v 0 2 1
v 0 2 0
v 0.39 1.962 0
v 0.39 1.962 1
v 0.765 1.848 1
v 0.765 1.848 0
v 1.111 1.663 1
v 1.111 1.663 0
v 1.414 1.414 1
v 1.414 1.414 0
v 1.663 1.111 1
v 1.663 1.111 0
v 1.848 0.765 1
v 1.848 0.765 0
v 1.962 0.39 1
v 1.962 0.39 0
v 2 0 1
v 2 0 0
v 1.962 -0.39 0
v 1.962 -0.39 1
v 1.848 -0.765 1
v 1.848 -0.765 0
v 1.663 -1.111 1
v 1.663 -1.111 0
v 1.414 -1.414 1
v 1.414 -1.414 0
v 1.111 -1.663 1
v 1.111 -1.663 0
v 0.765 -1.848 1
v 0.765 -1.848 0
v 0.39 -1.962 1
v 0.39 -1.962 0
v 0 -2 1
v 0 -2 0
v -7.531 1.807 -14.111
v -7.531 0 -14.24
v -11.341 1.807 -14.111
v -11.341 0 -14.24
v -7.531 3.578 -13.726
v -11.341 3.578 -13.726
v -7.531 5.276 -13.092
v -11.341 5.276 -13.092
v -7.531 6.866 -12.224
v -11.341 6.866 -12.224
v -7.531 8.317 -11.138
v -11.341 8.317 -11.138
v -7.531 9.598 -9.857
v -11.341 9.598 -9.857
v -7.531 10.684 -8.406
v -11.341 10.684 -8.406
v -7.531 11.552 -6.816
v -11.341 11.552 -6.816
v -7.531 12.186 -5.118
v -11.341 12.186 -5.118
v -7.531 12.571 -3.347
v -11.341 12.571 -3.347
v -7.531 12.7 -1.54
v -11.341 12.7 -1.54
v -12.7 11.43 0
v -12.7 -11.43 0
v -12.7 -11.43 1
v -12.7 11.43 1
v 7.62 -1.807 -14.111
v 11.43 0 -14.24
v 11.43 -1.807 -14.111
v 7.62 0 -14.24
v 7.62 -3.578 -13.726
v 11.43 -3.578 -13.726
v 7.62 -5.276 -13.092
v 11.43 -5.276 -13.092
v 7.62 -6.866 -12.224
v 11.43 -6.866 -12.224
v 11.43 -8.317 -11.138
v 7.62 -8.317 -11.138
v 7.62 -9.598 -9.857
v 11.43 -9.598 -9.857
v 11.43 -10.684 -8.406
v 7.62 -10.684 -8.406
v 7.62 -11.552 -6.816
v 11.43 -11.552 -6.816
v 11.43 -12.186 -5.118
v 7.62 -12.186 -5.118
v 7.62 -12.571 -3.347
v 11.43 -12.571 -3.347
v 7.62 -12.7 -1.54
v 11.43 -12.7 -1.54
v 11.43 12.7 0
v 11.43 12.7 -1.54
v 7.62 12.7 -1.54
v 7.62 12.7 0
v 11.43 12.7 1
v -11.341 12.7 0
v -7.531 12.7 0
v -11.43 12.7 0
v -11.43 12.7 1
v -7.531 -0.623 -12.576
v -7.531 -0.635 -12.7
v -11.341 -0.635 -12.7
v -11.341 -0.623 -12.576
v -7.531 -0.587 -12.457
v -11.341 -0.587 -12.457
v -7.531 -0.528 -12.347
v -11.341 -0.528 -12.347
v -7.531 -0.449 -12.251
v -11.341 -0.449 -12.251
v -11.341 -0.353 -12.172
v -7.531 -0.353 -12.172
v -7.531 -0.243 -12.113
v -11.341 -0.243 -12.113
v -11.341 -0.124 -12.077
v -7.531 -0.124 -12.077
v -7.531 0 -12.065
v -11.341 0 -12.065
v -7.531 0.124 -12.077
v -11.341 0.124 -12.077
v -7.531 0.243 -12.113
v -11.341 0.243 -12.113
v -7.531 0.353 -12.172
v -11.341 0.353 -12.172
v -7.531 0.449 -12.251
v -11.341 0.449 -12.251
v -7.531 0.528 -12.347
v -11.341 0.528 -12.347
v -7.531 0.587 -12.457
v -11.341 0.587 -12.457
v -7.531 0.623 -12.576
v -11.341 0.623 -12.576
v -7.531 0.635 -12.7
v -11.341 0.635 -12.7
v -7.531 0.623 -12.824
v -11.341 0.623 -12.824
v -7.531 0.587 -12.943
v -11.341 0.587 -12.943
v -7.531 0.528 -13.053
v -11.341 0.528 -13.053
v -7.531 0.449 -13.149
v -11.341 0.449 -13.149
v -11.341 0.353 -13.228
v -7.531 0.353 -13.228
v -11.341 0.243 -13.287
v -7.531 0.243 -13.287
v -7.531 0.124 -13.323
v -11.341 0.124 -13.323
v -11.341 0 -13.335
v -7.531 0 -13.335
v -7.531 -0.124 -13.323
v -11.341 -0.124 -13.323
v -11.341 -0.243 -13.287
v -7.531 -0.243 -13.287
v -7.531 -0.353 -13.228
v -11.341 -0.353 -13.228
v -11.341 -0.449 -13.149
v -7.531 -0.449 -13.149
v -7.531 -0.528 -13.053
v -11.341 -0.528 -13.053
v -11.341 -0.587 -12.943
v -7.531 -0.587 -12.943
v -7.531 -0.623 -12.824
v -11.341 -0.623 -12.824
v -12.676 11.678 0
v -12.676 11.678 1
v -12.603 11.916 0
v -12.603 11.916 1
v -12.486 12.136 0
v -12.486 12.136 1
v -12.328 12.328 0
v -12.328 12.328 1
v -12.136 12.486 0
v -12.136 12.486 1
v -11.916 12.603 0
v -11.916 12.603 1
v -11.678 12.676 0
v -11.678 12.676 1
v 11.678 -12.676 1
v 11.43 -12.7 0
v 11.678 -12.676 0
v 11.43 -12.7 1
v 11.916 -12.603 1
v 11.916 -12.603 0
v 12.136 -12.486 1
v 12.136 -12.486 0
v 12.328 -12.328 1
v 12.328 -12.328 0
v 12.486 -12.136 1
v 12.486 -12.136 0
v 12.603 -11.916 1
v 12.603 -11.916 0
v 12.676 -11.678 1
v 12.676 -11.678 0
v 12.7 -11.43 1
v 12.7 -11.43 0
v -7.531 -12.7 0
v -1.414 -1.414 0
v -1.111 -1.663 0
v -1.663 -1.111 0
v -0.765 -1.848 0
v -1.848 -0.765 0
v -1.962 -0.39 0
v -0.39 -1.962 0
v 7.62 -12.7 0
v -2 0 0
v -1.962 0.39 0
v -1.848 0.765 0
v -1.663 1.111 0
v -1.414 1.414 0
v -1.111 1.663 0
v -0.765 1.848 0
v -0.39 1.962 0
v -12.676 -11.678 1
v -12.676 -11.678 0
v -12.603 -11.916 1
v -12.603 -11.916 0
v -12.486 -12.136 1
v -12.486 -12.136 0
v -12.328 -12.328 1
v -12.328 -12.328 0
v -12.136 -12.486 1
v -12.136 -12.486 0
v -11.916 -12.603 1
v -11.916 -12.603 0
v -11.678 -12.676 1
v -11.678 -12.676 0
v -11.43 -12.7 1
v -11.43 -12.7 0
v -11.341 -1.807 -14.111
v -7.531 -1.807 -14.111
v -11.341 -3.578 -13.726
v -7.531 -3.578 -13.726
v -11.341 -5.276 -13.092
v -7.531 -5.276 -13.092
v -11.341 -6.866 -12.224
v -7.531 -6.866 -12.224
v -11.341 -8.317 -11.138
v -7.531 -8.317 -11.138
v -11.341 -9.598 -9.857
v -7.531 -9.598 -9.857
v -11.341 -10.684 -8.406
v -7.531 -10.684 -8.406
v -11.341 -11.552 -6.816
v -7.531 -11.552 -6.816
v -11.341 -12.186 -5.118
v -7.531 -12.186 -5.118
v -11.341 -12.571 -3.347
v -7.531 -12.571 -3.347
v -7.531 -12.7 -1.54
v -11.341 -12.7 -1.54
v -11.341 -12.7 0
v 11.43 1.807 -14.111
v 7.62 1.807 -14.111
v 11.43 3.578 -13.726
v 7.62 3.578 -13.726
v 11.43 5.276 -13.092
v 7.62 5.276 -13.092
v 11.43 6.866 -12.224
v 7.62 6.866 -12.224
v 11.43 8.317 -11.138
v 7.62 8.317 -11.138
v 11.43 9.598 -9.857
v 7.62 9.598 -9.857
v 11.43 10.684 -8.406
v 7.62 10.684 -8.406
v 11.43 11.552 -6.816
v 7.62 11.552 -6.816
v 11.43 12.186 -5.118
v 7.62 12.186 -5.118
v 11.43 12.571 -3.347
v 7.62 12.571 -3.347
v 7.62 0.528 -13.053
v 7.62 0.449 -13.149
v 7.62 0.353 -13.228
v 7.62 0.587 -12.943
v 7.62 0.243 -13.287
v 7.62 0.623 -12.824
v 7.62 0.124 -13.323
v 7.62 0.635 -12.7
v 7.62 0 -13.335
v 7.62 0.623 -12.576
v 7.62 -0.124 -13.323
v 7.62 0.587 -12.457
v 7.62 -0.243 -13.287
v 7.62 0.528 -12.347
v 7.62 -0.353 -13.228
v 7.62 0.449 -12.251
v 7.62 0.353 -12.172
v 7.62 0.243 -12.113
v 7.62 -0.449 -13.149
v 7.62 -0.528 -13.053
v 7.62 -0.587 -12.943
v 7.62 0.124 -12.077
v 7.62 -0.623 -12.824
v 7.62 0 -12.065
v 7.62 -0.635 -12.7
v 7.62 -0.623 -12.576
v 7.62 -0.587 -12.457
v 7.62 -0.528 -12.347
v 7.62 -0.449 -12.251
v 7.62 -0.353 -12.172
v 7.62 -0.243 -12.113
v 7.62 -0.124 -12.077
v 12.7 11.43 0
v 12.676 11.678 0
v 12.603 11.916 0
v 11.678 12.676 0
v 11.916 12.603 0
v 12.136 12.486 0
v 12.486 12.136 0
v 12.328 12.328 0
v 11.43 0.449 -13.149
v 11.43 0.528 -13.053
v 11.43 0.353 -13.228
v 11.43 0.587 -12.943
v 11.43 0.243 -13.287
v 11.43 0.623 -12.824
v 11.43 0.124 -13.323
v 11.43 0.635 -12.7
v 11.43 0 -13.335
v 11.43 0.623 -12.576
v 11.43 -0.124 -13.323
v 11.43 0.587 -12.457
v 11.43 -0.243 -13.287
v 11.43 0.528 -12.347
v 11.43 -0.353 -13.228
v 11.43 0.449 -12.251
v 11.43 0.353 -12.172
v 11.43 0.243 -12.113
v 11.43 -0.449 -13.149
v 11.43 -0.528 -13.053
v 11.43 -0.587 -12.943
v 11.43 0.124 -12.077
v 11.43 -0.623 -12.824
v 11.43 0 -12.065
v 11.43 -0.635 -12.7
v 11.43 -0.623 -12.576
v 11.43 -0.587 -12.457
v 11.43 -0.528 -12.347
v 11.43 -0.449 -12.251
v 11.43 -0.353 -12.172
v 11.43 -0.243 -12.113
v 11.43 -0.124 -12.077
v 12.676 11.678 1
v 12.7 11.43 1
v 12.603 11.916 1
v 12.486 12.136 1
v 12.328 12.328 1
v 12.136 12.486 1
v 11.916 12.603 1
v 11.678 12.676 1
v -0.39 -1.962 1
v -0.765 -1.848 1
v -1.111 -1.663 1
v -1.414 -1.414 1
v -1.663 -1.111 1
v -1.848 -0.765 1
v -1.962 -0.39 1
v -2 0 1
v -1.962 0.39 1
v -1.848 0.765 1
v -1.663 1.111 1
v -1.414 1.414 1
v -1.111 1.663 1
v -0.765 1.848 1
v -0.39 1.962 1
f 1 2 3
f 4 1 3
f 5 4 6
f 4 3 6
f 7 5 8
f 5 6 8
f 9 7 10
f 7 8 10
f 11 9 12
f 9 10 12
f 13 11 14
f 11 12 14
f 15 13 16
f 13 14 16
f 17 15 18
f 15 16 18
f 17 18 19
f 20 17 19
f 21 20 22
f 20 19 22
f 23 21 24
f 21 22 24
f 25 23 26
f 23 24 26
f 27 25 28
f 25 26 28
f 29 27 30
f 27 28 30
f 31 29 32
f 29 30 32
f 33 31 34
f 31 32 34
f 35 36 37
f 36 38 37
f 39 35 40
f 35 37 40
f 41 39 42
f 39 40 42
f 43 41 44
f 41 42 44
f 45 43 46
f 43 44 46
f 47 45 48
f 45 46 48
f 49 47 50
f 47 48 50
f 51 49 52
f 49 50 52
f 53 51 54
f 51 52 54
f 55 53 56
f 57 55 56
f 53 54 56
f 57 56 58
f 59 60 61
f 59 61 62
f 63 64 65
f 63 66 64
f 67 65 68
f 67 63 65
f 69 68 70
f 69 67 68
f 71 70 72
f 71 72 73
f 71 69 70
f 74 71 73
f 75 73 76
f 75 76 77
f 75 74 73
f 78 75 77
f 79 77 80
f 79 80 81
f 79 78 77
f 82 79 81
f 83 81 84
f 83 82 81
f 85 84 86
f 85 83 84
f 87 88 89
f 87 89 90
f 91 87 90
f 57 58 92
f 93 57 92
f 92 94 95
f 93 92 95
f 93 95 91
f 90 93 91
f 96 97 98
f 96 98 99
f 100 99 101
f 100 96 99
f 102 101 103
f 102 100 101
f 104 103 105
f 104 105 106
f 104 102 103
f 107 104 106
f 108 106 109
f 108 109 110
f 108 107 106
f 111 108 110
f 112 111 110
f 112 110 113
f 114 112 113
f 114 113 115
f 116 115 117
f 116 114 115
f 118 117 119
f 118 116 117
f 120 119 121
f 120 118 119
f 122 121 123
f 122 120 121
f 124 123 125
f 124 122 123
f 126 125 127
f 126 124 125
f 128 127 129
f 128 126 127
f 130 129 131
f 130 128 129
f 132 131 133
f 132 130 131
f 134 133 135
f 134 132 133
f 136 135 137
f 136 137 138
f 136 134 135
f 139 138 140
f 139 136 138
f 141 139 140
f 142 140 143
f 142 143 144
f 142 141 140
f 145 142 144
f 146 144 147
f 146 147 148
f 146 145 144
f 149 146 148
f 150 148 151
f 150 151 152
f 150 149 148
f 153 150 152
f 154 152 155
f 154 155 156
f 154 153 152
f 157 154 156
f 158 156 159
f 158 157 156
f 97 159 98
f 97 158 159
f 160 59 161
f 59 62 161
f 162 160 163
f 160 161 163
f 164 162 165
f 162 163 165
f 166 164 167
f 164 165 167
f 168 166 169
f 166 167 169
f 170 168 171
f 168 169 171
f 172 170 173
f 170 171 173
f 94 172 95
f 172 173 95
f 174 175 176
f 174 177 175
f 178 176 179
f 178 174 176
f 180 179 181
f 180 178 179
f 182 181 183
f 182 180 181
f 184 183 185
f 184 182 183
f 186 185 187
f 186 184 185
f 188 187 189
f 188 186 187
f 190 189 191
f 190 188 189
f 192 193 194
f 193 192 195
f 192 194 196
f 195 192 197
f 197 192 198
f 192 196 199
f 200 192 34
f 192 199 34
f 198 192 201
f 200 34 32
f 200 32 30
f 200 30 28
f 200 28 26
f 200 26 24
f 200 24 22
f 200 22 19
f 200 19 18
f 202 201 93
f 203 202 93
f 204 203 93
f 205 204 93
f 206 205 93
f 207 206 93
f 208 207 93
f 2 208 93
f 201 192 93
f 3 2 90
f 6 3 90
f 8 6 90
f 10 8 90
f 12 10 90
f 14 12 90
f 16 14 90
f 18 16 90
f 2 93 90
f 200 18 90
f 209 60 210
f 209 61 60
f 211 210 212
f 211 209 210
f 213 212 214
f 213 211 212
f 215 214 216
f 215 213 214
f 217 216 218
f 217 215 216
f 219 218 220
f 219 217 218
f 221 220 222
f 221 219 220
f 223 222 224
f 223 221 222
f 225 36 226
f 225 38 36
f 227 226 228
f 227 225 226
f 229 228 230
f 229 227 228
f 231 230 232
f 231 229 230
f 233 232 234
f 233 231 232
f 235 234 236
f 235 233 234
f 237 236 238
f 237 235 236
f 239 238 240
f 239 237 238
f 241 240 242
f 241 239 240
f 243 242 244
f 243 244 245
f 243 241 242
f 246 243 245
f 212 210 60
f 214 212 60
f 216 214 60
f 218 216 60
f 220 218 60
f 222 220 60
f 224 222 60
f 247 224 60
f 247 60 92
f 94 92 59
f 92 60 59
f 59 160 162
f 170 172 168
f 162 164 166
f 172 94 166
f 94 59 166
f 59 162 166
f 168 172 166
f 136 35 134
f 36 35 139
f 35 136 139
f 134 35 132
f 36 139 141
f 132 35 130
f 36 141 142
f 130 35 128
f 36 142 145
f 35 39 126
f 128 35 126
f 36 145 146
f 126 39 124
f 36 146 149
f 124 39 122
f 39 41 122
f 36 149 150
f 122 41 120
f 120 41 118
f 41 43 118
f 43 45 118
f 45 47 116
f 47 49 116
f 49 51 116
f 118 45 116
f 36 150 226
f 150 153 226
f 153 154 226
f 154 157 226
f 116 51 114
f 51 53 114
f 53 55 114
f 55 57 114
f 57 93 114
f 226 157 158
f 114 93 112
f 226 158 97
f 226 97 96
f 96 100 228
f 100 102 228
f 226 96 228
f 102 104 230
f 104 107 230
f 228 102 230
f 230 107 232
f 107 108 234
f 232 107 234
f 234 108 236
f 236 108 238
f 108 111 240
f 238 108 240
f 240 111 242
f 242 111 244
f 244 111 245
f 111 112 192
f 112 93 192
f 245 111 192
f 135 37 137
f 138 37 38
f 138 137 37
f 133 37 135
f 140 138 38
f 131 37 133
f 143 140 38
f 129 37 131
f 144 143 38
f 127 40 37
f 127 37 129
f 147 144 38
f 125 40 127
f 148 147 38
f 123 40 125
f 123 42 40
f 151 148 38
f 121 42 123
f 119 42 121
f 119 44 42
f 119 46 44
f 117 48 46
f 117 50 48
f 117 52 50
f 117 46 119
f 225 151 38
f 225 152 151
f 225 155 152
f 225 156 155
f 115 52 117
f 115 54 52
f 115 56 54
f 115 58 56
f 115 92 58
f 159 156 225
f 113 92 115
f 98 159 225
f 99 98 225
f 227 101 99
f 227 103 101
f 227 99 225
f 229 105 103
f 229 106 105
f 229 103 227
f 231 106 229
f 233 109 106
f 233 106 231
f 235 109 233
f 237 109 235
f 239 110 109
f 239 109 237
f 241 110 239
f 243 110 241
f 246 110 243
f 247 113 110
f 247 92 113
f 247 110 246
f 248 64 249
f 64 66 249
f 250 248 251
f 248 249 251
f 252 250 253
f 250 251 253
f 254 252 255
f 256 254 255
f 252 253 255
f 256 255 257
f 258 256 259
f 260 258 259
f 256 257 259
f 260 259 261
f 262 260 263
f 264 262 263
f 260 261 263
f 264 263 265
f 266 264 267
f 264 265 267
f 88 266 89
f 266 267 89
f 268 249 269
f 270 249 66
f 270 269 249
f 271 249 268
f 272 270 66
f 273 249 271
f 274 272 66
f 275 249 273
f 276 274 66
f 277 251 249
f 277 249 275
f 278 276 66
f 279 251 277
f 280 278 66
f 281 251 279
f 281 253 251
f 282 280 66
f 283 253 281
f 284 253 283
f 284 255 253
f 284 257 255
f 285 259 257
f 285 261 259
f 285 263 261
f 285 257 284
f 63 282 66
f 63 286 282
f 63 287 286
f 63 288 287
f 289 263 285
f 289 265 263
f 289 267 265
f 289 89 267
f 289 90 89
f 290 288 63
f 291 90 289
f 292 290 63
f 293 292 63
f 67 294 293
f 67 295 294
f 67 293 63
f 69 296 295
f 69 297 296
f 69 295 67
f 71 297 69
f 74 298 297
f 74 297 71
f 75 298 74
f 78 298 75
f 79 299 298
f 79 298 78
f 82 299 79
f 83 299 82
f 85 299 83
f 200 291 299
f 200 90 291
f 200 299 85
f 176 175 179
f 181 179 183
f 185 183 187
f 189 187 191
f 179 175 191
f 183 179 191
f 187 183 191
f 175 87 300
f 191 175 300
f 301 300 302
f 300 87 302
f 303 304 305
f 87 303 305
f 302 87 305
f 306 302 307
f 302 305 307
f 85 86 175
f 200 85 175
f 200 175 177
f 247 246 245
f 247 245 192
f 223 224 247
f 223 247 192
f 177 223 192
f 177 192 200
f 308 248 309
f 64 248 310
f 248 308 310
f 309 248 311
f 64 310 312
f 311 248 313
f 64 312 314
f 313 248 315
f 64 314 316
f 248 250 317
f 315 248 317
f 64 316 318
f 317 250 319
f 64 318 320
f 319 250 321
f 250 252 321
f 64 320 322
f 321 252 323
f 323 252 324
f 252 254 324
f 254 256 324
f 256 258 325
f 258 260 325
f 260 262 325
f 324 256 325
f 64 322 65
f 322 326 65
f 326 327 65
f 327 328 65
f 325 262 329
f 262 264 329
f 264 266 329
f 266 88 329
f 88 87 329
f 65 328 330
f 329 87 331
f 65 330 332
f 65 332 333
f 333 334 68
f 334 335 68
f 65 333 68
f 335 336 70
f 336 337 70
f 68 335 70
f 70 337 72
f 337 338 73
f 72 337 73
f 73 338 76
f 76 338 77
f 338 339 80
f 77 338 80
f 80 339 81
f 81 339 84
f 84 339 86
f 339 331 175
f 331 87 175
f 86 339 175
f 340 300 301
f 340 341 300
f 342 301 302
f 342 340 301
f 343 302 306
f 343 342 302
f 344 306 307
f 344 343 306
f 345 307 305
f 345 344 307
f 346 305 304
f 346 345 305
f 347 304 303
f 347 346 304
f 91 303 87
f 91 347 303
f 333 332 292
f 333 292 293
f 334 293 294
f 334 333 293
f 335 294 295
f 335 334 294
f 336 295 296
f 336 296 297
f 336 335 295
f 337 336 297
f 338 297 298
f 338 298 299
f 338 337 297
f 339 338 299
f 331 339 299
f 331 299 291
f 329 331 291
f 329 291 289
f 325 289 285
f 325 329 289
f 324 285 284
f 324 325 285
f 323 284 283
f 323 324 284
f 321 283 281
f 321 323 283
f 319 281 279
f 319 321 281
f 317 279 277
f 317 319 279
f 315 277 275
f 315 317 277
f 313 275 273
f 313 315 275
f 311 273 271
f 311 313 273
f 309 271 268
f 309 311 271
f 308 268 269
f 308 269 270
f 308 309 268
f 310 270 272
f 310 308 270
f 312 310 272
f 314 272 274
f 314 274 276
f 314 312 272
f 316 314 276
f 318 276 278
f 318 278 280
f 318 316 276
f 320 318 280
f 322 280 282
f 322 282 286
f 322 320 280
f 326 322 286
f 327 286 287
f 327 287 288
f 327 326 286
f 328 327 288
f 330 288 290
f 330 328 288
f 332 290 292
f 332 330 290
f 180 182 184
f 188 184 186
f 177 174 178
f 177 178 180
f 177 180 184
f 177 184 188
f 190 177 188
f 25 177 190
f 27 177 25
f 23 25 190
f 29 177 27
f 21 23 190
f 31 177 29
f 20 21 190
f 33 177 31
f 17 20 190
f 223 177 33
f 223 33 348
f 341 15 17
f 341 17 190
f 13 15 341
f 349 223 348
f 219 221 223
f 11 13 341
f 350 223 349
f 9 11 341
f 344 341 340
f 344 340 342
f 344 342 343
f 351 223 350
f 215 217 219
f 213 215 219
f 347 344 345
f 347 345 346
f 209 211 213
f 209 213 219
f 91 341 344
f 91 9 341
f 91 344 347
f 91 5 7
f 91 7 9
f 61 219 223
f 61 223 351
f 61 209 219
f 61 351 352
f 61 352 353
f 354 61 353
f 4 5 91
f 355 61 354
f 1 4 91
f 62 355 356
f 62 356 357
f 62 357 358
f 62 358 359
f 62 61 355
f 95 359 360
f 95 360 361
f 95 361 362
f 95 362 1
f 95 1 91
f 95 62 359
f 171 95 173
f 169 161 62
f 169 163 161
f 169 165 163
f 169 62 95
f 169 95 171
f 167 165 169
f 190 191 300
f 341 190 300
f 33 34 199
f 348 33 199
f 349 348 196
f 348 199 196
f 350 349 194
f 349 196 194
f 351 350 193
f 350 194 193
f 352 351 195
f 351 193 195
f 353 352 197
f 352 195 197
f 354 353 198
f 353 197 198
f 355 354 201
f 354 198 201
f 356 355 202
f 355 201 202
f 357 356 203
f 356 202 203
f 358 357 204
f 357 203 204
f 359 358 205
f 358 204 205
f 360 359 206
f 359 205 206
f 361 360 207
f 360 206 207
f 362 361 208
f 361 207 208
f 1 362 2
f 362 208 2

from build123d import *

# Parameters (mm, degrees)
F0_W     = 1.27
F0_H     = 25.4
F1_DEPTH = 1
F2_W     = 25.4
F2_H     = 14.24
F2_R     = 0.635
F2_H_2   = 1
F3_DEPTH = 3.81
F5_R     = 12.69999
F6_R     = 12.69999
F7_R     = 1.26999
F7_2_R   = 1.26999
F8_DEPTH = 0.0889


# Not quite as in the source:
# - a fillet or chamfer is up to 0.001 mm smaller than in the source, because OpenCascade refuses the exact size


with BuildPart() as f1:
    # F0 (on Top) → F1 (new body)
    with BuildSketch(Plane.XY):
        with Locations((-12.065, 0)):
            Rectangle(F0_W, F0_H)
    extrude(amount=F1_DEPTH)

    # F7 (radius 1.27 in the source; OpenCascade refuses exactly that, so slightly less here)
    f7_edges = [f1.edges().sort_by_distance(p)[0] for p in [
        (-12.7, -12.7, 0.5),
        (-12.7, 12.7, 0.5),
    ]]
    fillet(f7_edges, radius=F7_R)

    # F8 (add): a face of the model
    f8_faces = [f1.faces().sort_by_distance(p)[0] for p in [
        (-11.43, 0, 0.5),
    ]]


with BuildPart() as f1b:
    # F0 (on Top) → F1, piece 2 (new body)
    with BuildSketch(Plane.XY):
        with Locations((12.065, 0)):
            Rectangle(F0_W, F0_H)
    extrude(amount=F1_DEPTH)

    # F7#2 (radius 1.27 in the source; OpenCascade refuses exactly that, so slightly less here)
    f7_2_edges = [f1b.edges().sort_by_distance(p)[0] for p in [
        (12.7, -12.7, 0.5),
        (12.7, 12.7, 0.5),
    ]]
    fillet(f7_2_edges, radius=F7_2_R)


with BuildPart() as f1c:
    # F0 (on Top) → F1, piece 3 (new body)
    with BuildSketch(Plane.XY):
        with BuildLine():
            Line((0, -12.7), (7.62, -12.7))
            Line((7.62, -12.7), (7.62, 12.7))
            Line((7.62, 12.7), (0, 12.7))
            Line((0, 12.7), (0, 2))
            ThreePointArc((0, 2), (1.4142135624, 1.4142135624), (2, 0))
            ThreePointArc((2, 0), (1.4142135624, -1.4142135624), (0, -2))
            Line((0, -2), (0, -12.7))
        make_face()
        with BuildLine():
            Line((-7.62, -12.7), (0, -12.7))
            Line((0, -12.7), (0, -2))
            ThreePointArc((0, -2), (-2, 0), (0, 2))
            Line((0, 2), (0, 12.7))
            Line((0, 12.7), (-7.62, 12.7))
            Line((-7.62, 12.7), (-7.62, -12.7))
        make_face()
    extrude(amount=F1_DEPTH)


with BuildPart() as f3:
    # F2 (on face) → F3 (new body)
    with BuildSketch(Plane(origin=(11.43, 0, 0), x_dir=(0, -1, 0), z_dir=(-1, 0, 0))):
        with Locations((0, -7.12)):
            Rectangle(F2_W, F2_H)
        with Locations((0, -12.7)):
            Circle(F2_R, mode=Mode.SUBTRACT)
        with Locations((0, 0.5)):
            Rectangle(F2_W, F2_H_2)
    extrude(amount=F3_DEPTH)


with BuildPart() as f4_1:
    # F4: copy of F3
    add(f3.part.moved(Location((-18.961354, 0, 0))))

    # F6 (radius 12.7 in the source; OpenCascade refuses exactly that, so slightly less here)
    f6_edges = [f4_1.edges().sort_by_distance(p)[0] for p in [
        (-9.436354, -12.7, -14.24),
        (-9.436354, 12.7, -14.24),
    ]]
    fillet(f6_edges, radius=F6_R)


with BuildPart() as f3_1:
    add(f3.part)

    # F5 (radius 12.7 in the source; OpenCascade refuses exactly that, so slightly less here)
    f5_edges = [f3_1.edges().sort_by_distance(p)[0] for p in [
        (9.525, -12.7, -14.24),
        (9.525, 12.7, -14.24),
    ]]
    fillet(f5_edges, radius=F5_R)


with BuildPart() as f1_1:
    add(f1.part)

    add(f1b.part)  # F8 merges F1b

    add(f1c.part)  # F8 merges F1c

    add(f3_1.part)  # F8 merges F3

    add(f4_1.part)  # F8 merges F4_1
    extrude(f8_faces, amount=F8_DEPTH)


solid = f1_1.part
